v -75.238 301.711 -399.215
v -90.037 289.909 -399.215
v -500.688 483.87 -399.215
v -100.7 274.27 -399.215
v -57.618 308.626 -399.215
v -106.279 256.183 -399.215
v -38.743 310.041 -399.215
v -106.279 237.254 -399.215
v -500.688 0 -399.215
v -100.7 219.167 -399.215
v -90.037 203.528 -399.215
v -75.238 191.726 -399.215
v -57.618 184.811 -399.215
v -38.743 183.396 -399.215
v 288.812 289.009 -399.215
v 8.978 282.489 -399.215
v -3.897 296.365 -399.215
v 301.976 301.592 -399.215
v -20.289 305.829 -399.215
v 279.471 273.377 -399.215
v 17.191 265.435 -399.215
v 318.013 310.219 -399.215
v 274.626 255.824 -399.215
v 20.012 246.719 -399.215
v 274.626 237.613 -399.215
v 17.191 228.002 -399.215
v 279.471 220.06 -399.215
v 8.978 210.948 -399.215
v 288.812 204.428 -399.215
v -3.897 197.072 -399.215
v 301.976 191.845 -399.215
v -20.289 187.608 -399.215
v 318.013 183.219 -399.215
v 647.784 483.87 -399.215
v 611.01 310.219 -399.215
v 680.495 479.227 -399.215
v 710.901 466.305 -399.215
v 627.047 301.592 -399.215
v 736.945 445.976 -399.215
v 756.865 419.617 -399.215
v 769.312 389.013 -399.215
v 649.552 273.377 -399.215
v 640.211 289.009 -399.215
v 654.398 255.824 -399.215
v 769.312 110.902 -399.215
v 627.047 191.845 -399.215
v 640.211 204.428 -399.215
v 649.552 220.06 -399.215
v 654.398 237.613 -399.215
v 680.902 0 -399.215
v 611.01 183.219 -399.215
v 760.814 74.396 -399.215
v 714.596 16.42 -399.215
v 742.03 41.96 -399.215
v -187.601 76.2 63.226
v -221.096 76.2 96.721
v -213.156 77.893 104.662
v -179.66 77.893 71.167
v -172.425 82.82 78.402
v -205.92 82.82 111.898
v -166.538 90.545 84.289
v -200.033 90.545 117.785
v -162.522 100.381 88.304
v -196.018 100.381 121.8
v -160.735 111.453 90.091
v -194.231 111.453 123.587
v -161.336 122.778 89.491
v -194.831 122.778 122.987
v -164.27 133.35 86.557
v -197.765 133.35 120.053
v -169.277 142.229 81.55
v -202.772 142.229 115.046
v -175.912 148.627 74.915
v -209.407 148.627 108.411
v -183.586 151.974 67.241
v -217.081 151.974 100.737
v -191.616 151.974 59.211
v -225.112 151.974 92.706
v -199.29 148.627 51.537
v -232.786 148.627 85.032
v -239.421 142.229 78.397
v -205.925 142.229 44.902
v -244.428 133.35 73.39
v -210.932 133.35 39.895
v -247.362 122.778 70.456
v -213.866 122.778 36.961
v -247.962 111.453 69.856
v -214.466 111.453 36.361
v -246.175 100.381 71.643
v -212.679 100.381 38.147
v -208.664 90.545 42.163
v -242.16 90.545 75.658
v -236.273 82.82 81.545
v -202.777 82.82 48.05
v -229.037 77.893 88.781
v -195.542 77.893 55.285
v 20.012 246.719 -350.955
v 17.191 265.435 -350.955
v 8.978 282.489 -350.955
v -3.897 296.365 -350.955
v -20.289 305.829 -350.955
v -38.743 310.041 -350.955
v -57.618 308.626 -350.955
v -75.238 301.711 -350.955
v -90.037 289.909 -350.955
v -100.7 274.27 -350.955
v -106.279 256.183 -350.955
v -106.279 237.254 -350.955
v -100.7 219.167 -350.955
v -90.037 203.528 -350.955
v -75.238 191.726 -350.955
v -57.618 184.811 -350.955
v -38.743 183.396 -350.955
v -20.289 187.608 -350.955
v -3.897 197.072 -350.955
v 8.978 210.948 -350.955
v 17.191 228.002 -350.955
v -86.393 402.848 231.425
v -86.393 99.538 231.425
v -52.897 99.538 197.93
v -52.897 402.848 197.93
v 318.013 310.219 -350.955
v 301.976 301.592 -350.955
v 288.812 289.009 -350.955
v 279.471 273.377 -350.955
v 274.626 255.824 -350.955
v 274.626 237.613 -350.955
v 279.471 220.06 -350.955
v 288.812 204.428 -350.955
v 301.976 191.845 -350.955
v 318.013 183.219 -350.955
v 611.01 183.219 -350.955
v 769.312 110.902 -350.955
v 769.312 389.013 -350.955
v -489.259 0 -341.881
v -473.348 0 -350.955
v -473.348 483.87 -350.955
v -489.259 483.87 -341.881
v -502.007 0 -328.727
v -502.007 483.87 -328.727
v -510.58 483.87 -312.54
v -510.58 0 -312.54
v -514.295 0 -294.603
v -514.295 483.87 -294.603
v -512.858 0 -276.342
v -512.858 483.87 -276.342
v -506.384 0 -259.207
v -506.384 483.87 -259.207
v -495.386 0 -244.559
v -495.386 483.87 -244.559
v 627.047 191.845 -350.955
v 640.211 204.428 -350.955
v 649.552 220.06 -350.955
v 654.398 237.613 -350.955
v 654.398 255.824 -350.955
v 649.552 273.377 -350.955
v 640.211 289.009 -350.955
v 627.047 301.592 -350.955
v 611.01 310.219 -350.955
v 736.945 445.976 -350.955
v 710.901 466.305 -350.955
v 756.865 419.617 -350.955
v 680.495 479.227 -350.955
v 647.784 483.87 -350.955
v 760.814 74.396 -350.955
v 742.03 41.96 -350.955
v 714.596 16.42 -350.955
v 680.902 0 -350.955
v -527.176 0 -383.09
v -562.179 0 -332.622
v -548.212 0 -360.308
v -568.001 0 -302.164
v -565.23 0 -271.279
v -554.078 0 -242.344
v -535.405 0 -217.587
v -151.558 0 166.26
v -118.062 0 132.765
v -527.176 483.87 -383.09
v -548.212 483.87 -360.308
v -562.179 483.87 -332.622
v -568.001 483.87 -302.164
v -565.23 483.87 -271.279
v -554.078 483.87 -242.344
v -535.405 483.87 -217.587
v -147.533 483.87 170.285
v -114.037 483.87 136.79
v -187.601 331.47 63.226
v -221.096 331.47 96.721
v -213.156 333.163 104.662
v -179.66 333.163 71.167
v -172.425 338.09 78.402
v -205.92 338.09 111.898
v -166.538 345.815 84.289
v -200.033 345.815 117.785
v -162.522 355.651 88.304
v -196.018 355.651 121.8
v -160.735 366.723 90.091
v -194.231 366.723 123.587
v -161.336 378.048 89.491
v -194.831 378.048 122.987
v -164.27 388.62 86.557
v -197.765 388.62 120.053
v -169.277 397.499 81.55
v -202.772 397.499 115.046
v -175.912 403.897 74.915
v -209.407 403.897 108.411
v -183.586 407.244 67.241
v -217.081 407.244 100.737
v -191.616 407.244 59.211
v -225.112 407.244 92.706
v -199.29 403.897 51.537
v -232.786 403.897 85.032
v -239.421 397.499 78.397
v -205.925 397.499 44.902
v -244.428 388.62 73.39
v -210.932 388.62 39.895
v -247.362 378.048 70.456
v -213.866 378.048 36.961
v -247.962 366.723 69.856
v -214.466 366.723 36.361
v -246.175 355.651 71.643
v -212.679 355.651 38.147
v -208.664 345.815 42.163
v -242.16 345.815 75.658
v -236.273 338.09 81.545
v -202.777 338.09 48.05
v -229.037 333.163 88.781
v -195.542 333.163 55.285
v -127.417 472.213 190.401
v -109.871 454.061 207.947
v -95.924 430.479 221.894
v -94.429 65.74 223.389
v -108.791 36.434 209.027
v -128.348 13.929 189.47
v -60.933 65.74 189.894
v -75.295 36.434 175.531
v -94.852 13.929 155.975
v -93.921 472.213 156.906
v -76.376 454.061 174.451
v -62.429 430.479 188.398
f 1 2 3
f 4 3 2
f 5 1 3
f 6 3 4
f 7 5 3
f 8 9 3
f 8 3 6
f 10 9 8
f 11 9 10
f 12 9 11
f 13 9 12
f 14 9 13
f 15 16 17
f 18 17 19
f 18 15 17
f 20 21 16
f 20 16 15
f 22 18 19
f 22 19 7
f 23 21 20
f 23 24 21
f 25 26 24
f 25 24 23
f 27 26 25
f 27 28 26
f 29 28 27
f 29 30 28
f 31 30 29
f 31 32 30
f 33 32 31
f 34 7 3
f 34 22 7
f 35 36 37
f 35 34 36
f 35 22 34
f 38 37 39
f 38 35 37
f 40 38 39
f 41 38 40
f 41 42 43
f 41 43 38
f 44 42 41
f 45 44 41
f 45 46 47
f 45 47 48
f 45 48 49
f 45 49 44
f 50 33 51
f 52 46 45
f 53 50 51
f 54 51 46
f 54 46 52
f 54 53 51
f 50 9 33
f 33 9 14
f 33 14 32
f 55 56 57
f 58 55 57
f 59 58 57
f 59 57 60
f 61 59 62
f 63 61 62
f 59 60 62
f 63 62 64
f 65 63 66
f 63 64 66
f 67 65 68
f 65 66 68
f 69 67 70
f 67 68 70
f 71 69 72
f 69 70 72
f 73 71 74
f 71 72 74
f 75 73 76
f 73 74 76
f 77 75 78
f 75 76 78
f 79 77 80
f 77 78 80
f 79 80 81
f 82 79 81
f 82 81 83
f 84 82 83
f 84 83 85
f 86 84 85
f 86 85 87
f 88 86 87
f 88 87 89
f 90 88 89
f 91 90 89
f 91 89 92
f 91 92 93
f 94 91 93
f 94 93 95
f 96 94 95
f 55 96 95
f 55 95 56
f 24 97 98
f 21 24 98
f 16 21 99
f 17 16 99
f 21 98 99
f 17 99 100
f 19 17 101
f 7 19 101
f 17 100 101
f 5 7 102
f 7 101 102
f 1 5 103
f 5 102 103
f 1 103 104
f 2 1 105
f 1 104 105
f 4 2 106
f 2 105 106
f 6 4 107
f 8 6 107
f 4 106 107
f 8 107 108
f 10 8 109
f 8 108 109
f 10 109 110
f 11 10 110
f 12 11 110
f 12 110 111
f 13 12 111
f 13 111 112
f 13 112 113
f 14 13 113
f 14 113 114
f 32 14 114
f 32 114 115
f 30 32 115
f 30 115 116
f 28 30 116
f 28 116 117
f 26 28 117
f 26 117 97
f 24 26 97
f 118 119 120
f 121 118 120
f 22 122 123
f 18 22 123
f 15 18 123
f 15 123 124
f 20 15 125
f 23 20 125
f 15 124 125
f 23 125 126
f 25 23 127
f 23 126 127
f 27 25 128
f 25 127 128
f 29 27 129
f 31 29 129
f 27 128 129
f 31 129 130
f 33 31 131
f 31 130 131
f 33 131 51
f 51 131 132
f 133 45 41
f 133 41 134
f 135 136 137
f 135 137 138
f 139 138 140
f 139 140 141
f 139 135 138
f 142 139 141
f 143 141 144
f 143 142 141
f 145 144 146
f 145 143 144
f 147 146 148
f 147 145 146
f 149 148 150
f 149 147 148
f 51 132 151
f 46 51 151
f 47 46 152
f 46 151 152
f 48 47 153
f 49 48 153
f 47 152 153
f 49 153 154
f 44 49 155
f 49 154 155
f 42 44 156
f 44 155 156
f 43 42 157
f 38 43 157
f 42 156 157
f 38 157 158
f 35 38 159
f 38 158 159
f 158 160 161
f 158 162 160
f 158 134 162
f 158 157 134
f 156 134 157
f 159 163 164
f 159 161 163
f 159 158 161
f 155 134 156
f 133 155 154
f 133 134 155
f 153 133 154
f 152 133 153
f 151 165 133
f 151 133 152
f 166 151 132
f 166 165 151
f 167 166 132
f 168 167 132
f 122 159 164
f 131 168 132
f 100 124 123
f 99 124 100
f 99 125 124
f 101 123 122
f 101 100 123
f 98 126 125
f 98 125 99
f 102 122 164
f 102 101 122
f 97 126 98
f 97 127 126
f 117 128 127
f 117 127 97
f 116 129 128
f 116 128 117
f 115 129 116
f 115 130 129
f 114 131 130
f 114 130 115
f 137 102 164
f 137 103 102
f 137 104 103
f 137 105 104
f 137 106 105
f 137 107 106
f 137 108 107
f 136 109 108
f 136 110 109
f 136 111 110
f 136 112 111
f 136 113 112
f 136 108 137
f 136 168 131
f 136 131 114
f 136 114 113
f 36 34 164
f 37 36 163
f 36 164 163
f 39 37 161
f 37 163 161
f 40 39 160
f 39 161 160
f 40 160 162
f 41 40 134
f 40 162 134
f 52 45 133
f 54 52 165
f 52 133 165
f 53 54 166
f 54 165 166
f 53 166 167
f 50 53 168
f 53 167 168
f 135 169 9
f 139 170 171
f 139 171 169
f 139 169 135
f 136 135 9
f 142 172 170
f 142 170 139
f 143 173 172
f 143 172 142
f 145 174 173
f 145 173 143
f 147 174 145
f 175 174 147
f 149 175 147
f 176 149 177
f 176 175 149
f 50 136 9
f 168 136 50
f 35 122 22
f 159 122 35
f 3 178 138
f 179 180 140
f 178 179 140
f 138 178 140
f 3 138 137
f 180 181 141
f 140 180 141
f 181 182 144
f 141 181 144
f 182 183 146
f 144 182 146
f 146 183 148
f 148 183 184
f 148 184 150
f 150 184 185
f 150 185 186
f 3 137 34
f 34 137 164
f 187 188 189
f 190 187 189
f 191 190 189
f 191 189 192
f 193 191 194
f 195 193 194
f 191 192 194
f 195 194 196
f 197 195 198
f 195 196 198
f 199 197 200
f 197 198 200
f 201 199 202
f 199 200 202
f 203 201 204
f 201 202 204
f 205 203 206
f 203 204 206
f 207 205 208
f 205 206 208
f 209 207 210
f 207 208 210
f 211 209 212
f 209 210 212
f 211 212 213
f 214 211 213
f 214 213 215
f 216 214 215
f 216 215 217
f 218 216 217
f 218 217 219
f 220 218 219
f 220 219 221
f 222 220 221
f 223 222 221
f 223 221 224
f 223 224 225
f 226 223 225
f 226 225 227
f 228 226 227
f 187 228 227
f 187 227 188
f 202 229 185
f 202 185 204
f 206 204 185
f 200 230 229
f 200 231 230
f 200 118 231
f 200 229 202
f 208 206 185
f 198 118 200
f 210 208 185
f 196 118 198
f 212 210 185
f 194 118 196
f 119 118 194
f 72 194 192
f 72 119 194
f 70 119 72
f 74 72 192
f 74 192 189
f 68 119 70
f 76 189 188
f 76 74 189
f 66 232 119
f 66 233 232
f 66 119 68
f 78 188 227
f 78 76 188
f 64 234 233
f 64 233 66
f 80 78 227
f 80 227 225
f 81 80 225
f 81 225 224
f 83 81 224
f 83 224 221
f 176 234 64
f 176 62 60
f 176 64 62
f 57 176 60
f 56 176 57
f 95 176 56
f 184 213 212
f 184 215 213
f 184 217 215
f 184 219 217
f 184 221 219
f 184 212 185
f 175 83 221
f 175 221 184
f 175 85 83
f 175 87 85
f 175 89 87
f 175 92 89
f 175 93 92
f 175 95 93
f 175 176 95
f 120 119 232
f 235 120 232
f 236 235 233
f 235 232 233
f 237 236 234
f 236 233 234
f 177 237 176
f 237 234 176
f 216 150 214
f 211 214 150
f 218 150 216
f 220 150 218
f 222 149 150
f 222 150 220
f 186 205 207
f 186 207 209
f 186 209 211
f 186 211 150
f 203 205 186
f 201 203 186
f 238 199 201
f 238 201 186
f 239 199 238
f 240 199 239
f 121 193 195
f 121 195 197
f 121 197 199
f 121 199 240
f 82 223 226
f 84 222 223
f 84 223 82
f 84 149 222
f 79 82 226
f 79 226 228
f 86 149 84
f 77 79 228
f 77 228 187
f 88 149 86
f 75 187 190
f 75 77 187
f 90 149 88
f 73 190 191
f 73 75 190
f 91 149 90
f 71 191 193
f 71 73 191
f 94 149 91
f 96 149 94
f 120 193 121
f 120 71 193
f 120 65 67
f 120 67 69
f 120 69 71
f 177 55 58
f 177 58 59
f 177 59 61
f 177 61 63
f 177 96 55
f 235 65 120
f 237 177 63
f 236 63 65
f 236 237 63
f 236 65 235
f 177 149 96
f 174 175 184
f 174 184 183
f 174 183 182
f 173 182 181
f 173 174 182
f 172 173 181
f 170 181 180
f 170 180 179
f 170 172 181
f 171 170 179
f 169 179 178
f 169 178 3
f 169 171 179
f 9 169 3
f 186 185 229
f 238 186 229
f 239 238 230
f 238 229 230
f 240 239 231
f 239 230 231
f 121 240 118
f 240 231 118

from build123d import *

# Parameters (mm, degrees)
F1_DEPTH = 483.87
F2_R     = 63.5
F2_W     = 292.9965630609
F2_H     = 127
F3_DEPTH = 48.261
F4_R     = 38.1
F5_DEPTH = 78.74
F6_DEPTH = 483.871


with BuildPart() as f1:
    # F0 (on Front) → F1 (new body)
    with BuildSketch(Plane.XZ):
        with BuildLine():
            Line((769.3116354294, -399.2148596497), (769.3116354294, -350.9548596497))
            Line((769.3116354294, -350.9548596497), (-473.3476042747, -350.9548596497))
            ThreePointArc((-473.3476042747, -350.9548596497), (-513.072288863, -303.7029004261), (-495.3859384083, -244.5590822901))
            Line((-495.3859384083, -244.5590822901), (-46.3731323549, 204.4537237633))
            Line((-46.3731323549, 204.4537237633), (-86.3926232658, 231.4253374939))
            Line((-86.3926232658, 231.4253374939), (-535.4054293192, -217.5874685596))
            ThreePointArc((-535.4054293192, -217.5874685596), (-566.1518276604, -317.596153827), (-500.6883645706, -399.2148596497))
            Line((-500.6883645706, -399.2148596497), (769.3116354294, -399.2148596497))
        make_face()
    extrude(amount=-F1_DEPTH)

    # F2 (on face) → F3 (cut, through all)
    with BuildSketch(Plane.XY.offset(-350.9548596497)):
        with Locations((-43.4883645706, 246.7185220676)):
            Circle(F2_R)
        with Locations((464.5116354294, 246.7185220676)):
            Rectangle(F2_W, F2_H)
        with BuildLine():
            ThreePointArc((611.0099169598, 183.2185220676), (655.0116354294, 246.7185220676), (611.0099169598, 310.2185220676))
            Line((611.0099169598, 310.2185220676), (611.0099169598, 183.2185220676))
        make_face()
        with BuildLine():
            Line((318.013353899, 183.2185220676), (318.013353899, 310.2185220676))
            ThreePointArc((318.013353899, 310.2185220676), (274.0116354294, 246.7185220676), (318.013353899, 183.2185220676))
        make_face()
        with BuildLine():
            ThreePointArc((647.7836660054, 483.87), (724.587147216, 456.9907780756), (769.3116354294, 389.0129327774))
            Line((769.3116354294, 389.0129327774), (769.3116354294, 483.87))
            Line((769.3116354294, 483.87), (647.7836660054, 483.87))
        make_face()
        with BuildLine():
            Line((769.3116354294, 0), (769.3116354294, 110.9018325806))
            ThreePointArc((769.3116354294, 110.9018325806), (742.030303117, 41.9598138448), (680.9021830559, 0))
            Line((680.9021830559, 0), (769.3116354294, 0))
        make_face()
    extrude(amount=-F3_DEPTH, mode=Mode.SUBTRACT)

    # F4 (on face) → F5 (cut)
    with BuildSketch(Plane(origin=(-158.9089803798, 0, 158.9089803798), x_dir=(0, -1, 0), z_dir=(-0.7071067812, 0, 0.7071067812))):
        with Locations((-369.57, -87.9463842754)):
            Circle(F4_R)
        with Locations((-114.3, -87.9463842754)):
            Circle(F4_R)
        with BuildLine():
            ThreePointArc((-99.5377227664, 102.5536157246), (-36.434263942, 70.8775530516), (0, 10.3964496136))
            Line((0, 10.3964496136), (0, 102.5536157246))
            Line((0, 102.5536157246), (-99.5377227664, 102.5536157246))
        make_face()
        with BuildLine():
            ThreePointArc((-483.87, 16.0886850208), (-454.0610525131, 69.3496689518), (-402.8477370739, 102.5536157246))
            Line((-402.8477370739, 102.5536157246), (-483.87, 102.5536157246))
            Line((-483.87, 102.5536157246), (-483.87, 16.0886850208))
        make_face()
    extrude(amount=-F5_DEPTH, mode=Mode.SUBTRACT)

    # F6 (cut, through all): a face of the model
    f6_faces = [f1.faces().sort_by_distance(p)[0] for p in [
        (-61.8876088552, 0, 211.2696154768),
    ]]
    extrude(f6_faces, amount=-F6_DEPTH, mode=Mode.SUBTRACT)


solid = f1.part
